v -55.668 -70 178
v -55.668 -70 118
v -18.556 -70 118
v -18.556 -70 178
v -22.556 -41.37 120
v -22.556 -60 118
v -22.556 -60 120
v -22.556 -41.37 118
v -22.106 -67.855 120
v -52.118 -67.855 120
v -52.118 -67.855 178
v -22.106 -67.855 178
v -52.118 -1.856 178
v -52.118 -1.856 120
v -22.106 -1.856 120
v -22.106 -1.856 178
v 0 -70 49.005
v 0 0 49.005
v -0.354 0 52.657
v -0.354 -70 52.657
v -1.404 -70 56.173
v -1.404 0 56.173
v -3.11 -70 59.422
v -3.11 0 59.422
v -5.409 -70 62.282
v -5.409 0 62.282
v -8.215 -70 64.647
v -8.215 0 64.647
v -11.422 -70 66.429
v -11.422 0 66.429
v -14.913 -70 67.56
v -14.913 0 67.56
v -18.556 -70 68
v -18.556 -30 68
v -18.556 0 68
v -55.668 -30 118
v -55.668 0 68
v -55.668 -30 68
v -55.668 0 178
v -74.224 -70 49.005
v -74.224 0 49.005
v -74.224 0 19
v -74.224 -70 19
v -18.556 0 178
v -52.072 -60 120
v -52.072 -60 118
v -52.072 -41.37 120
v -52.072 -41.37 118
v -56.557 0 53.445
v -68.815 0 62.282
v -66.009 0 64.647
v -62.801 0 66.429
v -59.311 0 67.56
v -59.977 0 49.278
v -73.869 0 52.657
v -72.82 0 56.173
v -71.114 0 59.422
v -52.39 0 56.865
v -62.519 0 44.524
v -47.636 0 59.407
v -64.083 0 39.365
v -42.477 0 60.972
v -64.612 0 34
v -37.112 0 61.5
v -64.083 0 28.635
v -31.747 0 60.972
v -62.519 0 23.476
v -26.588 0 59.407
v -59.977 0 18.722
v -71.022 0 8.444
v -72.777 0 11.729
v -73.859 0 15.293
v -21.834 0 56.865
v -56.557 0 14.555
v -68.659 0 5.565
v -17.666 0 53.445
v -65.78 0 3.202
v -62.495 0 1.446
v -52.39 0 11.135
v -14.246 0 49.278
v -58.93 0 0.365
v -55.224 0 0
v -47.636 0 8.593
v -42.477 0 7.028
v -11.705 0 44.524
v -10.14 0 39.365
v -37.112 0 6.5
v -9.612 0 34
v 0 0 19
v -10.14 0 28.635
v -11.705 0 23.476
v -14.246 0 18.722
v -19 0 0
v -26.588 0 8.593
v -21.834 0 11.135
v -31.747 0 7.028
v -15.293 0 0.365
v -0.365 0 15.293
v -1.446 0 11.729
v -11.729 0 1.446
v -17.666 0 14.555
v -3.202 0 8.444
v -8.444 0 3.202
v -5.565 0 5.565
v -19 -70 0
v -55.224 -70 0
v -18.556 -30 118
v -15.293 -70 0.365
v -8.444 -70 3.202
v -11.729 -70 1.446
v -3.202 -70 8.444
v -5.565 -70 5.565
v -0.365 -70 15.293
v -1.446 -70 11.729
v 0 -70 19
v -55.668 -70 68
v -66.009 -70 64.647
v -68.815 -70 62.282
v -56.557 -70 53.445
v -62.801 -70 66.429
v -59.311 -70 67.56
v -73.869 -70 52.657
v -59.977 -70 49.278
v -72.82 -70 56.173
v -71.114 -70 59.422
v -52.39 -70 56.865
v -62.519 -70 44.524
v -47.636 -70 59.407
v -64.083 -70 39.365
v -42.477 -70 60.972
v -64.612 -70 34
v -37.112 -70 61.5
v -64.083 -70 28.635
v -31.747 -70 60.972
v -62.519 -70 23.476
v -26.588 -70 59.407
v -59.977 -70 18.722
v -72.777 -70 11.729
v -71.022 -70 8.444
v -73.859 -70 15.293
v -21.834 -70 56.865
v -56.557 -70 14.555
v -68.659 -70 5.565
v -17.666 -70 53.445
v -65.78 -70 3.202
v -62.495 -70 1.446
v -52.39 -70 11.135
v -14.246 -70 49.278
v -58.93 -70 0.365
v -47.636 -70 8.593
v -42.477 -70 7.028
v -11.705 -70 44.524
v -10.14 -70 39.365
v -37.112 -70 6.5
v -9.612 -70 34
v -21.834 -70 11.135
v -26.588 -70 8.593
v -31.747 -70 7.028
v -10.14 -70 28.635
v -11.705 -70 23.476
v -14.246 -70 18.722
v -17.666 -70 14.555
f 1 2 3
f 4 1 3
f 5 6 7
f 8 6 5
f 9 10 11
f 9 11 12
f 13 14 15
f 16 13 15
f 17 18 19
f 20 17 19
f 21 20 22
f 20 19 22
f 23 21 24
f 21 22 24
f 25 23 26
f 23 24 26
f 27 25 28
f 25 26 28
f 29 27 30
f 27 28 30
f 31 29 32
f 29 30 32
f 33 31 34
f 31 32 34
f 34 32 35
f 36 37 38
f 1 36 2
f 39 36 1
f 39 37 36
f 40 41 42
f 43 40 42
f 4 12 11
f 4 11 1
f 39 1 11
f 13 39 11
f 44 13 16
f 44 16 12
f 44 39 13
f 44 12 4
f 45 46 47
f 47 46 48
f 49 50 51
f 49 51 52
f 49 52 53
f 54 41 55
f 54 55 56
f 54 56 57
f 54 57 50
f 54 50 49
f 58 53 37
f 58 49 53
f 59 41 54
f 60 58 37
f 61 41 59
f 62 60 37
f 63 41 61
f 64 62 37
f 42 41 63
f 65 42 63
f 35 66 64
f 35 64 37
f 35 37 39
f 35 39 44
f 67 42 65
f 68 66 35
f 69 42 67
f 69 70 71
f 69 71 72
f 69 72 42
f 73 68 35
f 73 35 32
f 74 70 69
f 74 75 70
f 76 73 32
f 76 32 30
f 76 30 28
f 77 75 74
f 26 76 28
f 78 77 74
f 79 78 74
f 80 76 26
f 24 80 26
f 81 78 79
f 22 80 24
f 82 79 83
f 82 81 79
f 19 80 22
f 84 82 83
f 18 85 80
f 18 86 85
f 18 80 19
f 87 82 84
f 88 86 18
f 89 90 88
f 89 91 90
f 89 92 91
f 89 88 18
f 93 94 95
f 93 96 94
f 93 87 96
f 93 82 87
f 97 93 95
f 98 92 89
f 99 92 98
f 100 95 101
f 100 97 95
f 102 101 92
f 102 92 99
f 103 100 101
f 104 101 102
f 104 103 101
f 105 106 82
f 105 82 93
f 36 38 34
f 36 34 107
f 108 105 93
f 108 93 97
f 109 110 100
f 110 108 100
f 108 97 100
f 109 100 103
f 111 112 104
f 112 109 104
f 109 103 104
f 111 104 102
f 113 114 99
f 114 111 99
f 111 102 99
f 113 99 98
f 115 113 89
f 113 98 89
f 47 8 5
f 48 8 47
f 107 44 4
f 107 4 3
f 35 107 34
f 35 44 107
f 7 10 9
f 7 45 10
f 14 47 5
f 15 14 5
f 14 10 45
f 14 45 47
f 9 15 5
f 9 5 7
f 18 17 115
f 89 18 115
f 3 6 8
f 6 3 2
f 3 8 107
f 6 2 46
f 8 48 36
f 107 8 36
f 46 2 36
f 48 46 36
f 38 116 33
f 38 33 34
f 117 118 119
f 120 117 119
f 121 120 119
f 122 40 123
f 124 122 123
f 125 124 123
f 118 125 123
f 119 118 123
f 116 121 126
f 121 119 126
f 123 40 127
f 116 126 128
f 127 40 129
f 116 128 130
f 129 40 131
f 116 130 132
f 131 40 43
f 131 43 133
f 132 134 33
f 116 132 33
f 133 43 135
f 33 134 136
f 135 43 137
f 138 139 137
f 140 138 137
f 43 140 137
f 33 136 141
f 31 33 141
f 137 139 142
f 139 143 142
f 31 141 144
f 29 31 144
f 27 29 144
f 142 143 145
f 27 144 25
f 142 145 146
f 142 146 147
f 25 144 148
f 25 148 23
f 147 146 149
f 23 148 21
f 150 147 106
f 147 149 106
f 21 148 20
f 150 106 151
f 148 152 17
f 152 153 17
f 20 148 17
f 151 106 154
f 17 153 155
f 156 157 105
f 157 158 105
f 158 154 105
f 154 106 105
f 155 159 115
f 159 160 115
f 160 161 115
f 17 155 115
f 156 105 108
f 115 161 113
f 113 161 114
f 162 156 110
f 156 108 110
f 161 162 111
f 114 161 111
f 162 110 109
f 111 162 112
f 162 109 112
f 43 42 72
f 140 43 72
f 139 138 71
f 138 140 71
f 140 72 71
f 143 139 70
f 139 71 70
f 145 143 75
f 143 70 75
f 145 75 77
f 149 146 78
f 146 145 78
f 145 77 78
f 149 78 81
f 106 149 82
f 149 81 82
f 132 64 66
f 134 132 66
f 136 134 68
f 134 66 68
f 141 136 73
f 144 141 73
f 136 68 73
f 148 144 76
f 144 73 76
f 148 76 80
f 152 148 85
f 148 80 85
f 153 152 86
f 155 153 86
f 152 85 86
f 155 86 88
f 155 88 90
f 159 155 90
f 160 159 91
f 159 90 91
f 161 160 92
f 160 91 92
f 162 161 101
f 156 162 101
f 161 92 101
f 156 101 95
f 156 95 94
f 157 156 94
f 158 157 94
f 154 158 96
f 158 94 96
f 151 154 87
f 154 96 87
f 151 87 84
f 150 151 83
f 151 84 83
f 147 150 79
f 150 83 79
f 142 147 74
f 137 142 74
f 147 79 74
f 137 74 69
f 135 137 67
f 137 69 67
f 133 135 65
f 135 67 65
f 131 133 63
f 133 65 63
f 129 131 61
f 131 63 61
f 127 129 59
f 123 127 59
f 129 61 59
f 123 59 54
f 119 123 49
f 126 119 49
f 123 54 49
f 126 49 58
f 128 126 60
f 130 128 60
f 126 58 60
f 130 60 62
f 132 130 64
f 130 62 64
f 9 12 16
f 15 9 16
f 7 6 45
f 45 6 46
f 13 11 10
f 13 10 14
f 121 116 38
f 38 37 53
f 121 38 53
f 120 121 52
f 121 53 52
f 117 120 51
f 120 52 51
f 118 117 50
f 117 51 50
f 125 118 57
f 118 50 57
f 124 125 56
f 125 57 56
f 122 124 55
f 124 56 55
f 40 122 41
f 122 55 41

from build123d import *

# Parameters (mm, degrees)
SKETCH1_W           = 74.22368895
SKETCH1_H           = 68
SKETCH1_W_2         = 37.111844475
SKETCH1_H_2         = 52
SKETCH1_H_3         = 58
BOSS_EXTRUDE1_DEPTH = 70
SKETCH2_R           = 27.5
CUT_EXTRUDE1_DEPTH  = 70
FILLET1_R           = 19
SKETCH3_W           = 33.111844475
SKETCH3_H           = 64.288874977
CUT_EXTRUDE2_DEPTH  = 58
SKETCH5_W           = 50
SKETCH5_H           = 40
CUT_EXTRUDE3_DEPTH  = 58
SKETCH7_W           = 29.516350972
SKETCH7_H           = 18.630296647
CUT_EXTRUDE5_DEPTH  = 58
SKETCH8_W           = 33.111844475
SKETCH8_H           = 2
CUT_EXTRUDE6_DEPTH  = 58
SKETCH9_W           = 1.55
SKETCH9_H           = 66.288874977
BOSS_EXTRUDE2_DEPTH = 58
SKETCH10_W          = 30.011844475
SKETCH10_H          = 0.145
BOSS_EXTRUDE3_DEPTH = 58


with BuildPart() as part:
    # Sketch1 → Boss-Extrude1 (new body)
    with BuildSketch(Plane(origin=(0, 0, 0), x_dir=(1, 0, 0), z_dir=(0, 1, 0))):
        with Locations((-37.111844475, -34)):
            Rectangle(SKETCH1_W, SKETCH1_H)
        with Locations((-37.111844475, -94)):
            Rectangle(SKETCH1_W_2, SKETCH1_H_2)
        with Locations((-37.111844475, -149)):
            Rectangle(SKETCH1_W_2, SKETCH1_H_3)
    extrude(amount=-BOSS_EXTRUDE1_DEPTH)

    # Sketch2 → Cut-Extrude1 (cut)
    with BuildSketch(Plane(origin=(0, 0, 0), x_dir=(1, 0, 0), z_dir=(0, 1, 0))):
        with Locations(Location((-37.111844475, -34, 0), (0, 0, 270))):
            Circle(SKETCH2_R)
    extrude(amount=-CUT_EXTRUDE1_DEPTH, mode=Mode.SUBTRACT)

    # Fillet1
    # the kernel refuses this fillet: 19 mm, written as the material it takes off along each edge
    with BuildSketch(Plane(origin=(0, 47.487024211, 68), x_dir=(0, 0, -1), z_dir=(0, -1, 0))) as fillet1_piece_1:
        with BuildLine():
            CenterArc((18.994809684, -19), FILLET1_R, 90, 88.660731648)
            Line((0, -18.555922237), (-0.379896194, -18.547040682))
            ThreePointArc((-0.379896194, -18.547040682), (-0.38, -9.277961119), (-0.38, 0))
            Line((-0.38, 0), (0, 0.38))
            Line((0, 0.38), (18.994809684, 0.38))
            Line((18.994809684, 0.38), (18.994809684, 0))
        make_face()
    extrude(amount=164.974048421, mode=Mode.SUBTRACT)
    with BuildSketch(Plane(origin=(0, 47.5, 0), x_dir=(-1, 0, 0), z_dir=(0, -1, 0))) as fillet1_piece_2:
        with BuildLine():
            CenterArc((FILLET1_R, -FILLET1_R), FILLET1_R, 90, 90)
            Line((0, -FILLET1_R), (-FILLET1_R * 0.02, -FILLET1_R))
            Line((-FILLET1_R * 0.02, -FILLET1_R), (-FILLET1_R * 0.02, FILLET1_R * 0.02))
            Line((-FILLET1_R * 0.02, FILLET1_R * 0.02), (FILLET1_R, FILLET1_R * 0.02))
            Line((FILLET1_R, FILLET1_R * 0.02), (FILLET1_R, 0))
        make_face()
    extrude(amount=165, mode=Mode.SUBTRACT)
    with BuildSketch(Plane(origin=(-74.22368895, 47.487024211, 68), x_dir=(0, 0, -1), z_dir=(0, -1, 0))) as fillet1_piece_3:
        with BuildLine():
            CenterArc((18.994809684, 19), FILLET1_R, 181.339268352, 88.660731648)
            Line((0, 18.555922237), (-0.379896194, 18.547040682))
            ThreePointArc((-0.379896194, 18.547040682), (-0.38, 9.277961119), (-0.38, 0))
            Line((-0.38, 0), (0, -0.38))
            Line((0, -0.38), (18.994809684, -0.38))
            Line((18.994809684, -0.38), (18.994809684, 0))
        make_face()
    extrude(amount=164.974048421, mode=Mode.SUBTRACT)
    with BuildSketch(Plane(origin=(-74.22368895, 47.5, 0), x_dir=(1, 0, 0), z_dir=(0, -1, 0))) as fillet1_piece_4:
        with BuildLine():
            CenterArc((FILLET1_R, FILLET1_R), FILLET1_R, 180, 90)
            Line((0, FILLET1_R), (-FILLET1_R * 0.02, FILLET1_R))
            Line((-FILLET1_R * 0.02, FILLET1_R), (-FILLET1_R * 0.02, -FILLET1_R * 0.02))
            Line((-FILLET1_R * 0.02, -FILLET1_R * 0.02), (FILLET1_R, -FILLET1_R * 0.02))
            Line((FILLET1_R, -FILLET1_R * 0.02), (FILLET1_R, 0))
        make_face()
    extrude(amount=165, mode=Mode.SUBTRACT)

    # Sketch3 → Cut-Extrude2 (cut)
    with BuildSketch(Plane.XY.offset(178)):
        with Locations((-37.111844475, -35.855562511)):
            Rectangle(SKETCH3_W, SKETCH3_H)
    extrude(amount=-CUT_EXTRUDE2_DEPTH, mode=Mode.SUBTRACT)

    # Sketch5 → Cut-Extrude3 (cut)
    with BuildSketch(Plane.ZY.offset(55.667766712)):
        with Locations((93, -50)):
            Rectangle(SKETCH5_W, SKETCH5_H)
    extrude(amount=-CUT_EXTRUDE3_DEPTH, mode=Mode.SUBTRACT)

    # Sketch7 → Cut-Extrude5 (cut)
    with BuildSketch(Plane(origin=(0, 0, 118), x_dir=(-1, 0, 0), z_dir=(0, 0, -1))):
        with Locations((37.314097723, -50.684851677)):
            Rectangle(SKETCH7_W, SKETCH7_H)
    extrude(amount=-CUT_EXTRUDE5_DEPTH, mode=Mode.SUBTRACT)

    # Sketch8 → Cut-Extrude6 (cut)
    with BuildSketch(Plane.XY.offset(178)):
        with Locations((-37.111844475, -2.711125023)):
            Rectangle(SKETCH8_W, SKETCH8_H)
    extrude(amount=-CUT_EXTRUDE6_DEPTH, mode=Mode.SUBTRACT)

    # Sketch9 → Boss-Extrude2 (add)
    with BuildSketch(Plane.XY.offset(178)):
        with Locations((-52.892766712, -34.855562511)):
            Rectangle(SKETCH9_W, SKETCH9_H)
        with Locations((-21.330922237, -34.855562511)):
            Rectangle(SKETCH9_W, SKETCH9_H)
    extrude(amount=-BOSS_EXTRUDE2_DEPTH)

    # Sketch10 → Boss-Extrude3 (add)
    with BuildSketch(Plane.XY.offset(178)):
        with Locations((-37.111844475, -67.9275)):
            Rectangle(SKETCH10_W, SKETCH10_H)
        with Locations((-37.111844475, -1.783625023)):
            Rectangle(SKETCH10_W, SKETCH10_H)
    extrude(amount=-BOSS_EXTRUDE3_DEPTH)


solid = part.part
